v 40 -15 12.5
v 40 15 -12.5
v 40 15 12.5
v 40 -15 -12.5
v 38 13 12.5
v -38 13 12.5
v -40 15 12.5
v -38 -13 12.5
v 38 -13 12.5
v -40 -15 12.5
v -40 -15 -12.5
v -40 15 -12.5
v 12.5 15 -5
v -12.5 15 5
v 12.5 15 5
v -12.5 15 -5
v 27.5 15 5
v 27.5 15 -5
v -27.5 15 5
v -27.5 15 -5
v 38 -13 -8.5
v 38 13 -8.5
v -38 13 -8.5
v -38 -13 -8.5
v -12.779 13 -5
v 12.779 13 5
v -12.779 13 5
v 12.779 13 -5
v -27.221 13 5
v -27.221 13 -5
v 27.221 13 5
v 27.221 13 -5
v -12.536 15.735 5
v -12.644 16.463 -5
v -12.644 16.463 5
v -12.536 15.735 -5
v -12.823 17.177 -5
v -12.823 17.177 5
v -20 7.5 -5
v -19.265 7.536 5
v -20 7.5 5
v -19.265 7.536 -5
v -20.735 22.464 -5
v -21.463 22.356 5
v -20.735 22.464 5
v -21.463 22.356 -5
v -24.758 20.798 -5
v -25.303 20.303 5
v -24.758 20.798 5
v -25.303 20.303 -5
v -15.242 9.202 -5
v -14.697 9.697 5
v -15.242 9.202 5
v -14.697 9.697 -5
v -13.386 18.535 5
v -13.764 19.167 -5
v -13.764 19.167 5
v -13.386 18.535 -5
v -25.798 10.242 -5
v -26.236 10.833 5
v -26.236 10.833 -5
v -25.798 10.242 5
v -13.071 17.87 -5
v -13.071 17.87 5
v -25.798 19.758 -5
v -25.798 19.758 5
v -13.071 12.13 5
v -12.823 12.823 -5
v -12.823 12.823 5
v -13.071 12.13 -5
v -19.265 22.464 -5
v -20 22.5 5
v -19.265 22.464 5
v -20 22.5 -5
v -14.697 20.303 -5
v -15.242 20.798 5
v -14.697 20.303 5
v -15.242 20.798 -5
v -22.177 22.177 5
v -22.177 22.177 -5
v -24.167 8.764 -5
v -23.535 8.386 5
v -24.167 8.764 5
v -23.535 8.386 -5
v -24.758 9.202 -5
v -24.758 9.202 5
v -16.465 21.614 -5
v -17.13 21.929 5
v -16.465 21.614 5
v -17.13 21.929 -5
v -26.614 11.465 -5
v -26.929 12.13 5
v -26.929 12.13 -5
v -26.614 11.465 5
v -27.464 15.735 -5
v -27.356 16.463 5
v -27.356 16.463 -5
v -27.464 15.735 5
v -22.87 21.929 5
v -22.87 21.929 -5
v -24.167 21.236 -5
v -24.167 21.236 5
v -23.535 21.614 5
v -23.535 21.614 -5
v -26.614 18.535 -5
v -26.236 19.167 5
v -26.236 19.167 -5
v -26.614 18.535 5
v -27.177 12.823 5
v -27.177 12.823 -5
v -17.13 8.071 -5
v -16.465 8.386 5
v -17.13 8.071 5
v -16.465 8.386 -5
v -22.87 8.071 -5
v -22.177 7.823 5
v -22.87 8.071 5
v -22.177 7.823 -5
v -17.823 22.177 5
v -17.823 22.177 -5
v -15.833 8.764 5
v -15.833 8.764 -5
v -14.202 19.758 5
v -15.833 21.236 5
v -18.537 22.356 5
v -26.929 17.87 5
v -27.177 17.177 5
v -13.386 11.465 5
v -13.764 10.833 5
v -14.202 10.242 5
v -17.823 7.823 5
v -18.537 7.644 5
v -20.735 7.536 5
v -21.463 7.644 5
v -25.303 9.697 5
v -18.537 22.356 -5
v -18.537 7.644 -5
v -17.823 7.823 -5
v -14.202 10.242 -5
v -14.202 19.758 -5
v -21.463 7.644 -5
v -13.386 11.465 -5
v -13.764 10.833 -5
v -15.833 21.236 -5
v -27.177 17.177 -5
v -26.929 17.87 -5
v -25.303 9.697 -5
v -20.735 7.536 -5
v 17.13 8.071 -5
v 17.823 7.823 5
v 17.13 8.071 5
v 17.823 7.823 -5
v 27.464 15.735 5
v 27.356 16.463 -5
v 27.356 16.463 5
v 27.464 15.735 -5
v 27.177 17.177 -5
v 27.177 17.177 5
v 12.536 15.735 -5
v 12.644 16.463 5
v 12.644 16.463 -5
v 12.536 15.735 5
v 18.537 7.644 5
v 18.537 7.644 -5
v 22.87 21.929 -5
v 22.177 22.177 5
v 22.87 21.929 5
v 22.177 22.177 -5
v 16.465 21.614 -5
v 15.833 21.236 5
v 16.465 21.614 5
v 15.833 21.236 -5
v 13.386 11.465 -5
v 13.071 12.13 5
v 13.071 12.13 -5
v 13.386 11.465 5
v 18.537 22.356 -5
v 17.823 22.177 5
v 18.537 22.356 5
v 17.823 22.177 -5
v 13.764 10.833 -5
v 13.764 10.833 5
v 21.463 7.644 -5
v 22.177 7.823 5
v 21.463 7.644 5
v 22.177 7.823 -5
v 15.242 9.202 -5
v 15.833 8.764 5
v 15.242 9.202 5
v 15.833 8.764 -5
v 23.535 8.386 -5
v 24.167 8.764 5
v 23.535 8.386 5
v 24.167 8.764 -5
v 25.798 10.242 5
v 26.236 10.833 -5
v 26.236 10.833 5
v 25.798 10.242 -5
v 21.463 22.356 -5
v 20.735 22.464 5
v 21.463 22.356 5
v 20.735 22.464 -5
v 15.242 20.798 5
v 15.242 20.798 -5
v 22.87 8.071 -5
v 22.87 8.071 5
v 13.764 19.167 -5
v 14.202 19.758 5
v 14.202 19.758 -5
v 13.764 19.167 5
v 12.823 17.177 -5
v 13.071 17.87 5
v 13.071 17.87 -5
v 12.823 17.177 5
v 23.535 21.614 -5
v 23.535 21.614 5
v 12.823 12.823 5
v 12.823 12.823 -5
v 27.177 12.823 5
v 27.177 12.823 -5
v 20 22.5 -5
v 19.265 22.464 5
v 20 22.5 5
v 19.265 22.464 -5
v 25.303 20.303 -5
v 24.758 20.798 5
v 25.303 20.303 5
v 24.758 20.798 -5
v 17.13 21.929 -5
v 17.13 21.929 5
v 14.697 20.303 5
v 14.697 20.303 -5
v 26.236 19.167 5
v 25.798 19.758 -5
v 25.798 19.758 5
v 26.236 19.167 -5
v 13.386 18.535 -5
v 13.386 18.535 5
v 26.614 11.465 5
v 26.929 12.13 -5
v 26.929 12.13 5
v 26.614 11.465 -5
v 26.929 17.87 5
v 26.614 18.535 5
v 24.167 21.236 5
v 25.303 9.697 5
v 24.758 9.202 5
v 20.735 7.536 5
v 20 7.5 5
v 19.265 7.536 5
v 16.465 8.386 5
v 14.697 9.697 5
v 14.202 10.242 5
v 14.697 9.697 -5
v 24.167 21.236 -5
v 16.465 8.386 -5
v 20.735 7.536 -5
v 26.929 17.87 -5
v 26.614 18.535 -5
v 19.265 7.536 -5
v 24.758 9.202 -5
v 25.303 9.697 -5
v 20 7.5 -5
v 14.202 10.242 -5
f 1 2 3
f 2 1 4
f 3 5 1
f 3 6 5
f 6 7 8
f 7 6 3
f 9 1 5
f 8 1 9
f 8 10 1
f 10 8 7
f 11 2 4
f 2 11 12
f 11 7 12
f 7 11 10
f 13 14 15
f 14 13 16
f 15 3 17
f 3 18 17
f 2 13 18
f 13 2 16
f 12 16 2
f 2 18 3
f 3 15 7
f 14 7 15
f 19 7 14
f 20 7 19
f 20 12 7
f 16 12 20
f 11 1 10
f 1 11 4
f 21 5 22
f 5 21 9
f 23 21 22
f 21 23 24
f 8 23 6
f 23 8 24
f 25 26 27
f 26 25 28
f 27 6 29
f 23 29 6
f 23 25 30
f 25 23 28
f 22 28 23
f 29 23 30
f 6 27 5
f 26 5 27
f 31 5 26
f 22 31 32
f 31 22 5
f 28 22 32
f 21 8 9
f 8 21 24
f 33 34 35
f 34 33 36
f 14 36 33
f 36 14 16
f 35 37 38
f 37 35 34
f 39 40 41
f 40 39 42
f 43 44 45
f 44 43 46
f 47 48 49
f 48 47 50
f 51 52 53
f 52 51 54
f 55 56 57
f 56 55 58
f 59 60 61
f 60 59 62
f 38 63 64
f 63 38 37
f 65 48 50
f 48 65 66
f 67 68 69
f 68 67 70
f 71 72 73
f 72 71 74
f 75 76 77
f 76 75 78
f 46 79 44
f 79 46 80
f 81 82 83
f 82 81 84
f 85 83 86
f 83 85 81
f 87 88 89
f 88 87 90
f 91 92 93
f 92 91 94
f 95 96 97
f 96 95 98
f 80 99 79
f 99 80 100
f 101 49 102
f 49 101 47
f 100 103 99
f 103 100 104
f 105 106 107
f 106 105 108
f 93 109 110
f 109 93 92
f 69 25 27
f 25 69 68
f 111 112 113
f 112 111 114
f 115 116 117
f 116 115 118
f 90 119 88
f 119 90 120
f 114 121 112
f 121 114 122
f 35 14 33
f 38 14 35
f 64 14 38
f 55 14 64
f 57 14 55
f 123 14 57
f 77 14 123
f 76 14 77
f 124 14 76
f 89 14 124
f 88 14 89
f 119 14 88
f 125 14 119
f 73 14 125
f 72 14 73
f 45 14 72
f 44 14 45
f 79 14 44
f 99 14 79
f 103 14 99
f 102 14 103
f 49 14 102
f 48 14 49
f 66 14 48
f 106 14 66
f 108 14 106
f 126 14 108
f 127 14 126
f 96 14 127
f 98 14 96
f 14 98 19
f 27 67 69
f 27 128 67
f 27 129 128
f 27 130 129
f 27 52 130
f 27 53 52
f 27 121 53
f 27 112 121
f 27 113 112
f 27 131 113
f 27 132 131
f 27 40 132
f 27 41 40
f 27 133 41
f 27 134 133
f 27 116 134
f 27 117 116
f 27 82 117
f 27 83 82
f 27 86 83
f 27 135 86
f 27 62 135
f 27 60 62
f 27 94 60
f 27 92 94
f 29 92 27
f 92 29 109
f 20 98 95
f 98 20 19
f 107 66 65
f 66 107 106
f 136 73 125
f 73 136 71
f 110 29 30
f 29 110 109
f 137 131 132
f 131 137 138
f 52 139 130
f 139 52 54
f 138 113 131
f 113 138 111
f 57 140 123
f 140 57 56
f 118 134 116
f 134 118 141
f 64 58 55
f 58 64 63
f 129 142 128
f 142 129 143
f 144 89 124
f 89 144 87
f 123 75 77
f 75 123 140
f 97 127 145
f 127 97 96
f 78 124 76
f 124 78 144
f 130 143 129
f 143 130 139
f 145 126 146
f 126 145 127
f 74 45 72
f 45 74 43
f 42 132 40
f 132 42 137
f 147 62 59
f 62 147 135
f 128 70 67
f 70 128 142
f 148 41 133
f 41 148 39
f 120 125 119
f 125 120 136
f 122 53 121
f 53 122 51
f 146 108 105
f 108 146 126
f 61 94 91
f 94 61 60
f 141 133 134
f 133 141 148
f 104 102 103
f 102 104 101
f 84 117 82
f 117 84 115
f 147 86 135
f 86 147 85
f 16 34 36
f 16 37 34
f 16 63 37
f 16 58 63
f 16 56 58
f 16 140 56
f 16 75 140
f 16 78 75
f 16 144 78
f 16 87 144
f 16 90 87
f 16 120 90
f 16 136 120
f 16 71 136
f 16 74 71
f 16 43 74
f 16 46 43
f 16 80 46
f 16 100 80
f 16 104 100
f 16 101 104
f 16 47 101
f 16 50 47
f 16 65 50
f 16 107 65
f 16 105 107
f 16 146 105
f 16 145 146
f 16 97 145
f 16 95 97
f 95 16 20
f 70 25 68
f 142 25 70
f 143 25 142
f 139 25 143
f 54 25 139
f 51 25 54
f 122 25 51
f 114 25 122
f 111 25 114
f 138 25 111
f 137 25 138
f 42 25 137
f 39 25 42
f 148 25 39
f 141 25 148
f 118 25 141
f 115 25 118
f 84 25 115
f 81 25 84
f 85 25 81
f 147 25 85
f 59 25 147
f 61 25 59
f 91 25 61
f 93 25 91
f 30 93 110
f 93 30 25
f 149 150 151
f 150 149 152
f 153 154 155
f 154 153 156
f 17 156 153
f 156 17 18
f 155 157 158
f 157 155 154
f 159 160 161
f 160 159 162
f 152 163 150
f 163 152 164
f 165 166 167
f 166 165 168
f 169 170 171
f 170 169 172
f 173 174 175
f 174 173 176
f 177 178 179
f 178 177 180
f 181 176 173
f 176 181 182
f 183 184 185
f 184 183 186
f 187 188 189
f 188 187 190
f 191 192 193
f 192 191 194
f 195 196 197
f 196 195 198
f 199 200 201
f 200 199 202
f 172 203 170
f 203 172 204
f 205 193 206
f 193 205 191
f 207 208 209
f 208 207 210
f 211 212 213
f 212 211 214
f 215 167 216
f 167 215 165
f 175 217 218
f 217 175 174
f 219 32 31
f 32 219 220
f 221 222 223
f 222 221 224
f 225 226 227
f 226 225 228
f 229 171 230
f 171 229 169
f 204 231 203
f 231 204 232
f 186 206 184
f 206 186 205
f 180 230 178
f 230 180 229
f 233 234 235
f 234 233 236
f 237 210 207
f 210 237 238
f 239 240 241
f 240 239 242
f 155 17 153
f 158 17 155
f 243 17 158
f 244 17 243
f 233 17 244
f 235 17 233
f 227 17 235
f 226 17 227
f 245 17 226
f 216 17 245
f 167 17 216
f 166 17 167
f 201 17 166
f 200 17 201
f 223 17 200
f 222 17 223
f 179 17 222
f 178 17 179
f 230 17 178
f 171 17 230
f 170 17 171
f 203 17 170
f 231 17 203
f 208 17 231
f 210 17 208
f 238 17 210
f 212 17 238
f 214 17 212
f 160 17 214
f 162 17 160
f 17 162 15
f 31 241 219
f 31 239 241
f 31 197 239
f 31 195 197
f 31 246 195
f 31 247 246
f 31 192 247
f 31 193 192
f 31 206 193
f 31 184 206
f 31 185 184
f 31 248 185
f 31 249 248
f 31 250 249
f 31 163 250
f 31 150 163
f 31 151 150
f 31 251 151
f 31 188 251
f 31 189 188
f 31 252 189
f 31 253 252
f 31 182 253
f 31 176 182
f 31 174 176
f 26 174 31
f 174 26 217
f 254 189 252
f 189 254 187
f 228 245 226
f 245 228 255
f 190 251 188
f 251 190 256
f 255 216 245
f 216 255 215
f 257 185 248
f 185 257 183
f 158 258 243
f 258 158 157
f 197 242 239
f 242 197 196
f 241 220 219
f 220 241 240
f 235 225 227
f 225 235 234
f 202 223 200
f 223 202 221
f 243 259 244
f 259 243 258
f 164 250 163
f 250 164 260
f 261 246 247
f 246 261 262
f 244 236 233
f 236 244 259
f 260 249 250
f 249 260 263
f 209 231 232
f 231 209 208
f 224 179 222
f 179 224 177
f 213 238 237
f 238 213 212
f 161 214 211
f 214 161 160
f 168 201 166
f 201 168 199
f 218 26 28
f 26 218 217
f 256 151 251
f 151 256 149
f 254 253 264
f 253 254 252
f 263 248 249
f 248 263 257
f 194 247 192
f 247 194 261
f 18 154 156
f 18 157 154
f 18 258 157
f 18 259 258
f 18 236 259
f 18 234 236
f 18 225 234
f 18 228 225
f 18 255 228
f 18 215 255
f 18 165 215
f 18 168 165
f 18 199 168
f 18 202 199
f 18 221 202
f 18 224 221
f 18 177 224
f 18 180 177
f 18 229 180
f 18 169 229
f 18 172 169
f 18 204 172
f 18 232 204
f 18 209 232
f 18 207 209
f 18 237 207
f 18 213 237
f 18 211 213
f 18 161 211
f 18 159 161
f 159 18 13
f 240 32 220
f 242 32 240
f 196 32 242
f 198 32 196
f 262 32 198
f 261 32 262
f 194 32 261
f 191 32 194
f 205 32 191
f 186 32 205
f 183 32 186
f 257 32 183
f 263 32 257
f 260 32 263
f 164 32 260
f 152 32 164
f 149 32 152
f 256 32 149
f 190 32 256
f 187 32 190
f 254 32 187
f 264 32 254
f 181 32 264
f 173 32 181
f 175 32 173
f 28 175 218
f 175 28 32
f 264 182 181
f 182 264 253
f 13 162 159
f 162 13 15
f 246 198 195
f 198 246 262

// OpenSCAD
// ЗрениеБПЛА-5 — Стереокамера
$fn = 64;
module camera_body() {
    difference() {
        cube([80,30,25], center=true);
        translate([0,0,2]) cube([76,26,21], center=true);
    }
}
module lens() {
    color([0.2,0.2,0.2])
    cylinder(d=15, h=10, center=true);
}
module assembly() {
    camera_body();
    translate([-20,15,0]) lens();
    translate([20,15,0]) lens();
}
assembly();
